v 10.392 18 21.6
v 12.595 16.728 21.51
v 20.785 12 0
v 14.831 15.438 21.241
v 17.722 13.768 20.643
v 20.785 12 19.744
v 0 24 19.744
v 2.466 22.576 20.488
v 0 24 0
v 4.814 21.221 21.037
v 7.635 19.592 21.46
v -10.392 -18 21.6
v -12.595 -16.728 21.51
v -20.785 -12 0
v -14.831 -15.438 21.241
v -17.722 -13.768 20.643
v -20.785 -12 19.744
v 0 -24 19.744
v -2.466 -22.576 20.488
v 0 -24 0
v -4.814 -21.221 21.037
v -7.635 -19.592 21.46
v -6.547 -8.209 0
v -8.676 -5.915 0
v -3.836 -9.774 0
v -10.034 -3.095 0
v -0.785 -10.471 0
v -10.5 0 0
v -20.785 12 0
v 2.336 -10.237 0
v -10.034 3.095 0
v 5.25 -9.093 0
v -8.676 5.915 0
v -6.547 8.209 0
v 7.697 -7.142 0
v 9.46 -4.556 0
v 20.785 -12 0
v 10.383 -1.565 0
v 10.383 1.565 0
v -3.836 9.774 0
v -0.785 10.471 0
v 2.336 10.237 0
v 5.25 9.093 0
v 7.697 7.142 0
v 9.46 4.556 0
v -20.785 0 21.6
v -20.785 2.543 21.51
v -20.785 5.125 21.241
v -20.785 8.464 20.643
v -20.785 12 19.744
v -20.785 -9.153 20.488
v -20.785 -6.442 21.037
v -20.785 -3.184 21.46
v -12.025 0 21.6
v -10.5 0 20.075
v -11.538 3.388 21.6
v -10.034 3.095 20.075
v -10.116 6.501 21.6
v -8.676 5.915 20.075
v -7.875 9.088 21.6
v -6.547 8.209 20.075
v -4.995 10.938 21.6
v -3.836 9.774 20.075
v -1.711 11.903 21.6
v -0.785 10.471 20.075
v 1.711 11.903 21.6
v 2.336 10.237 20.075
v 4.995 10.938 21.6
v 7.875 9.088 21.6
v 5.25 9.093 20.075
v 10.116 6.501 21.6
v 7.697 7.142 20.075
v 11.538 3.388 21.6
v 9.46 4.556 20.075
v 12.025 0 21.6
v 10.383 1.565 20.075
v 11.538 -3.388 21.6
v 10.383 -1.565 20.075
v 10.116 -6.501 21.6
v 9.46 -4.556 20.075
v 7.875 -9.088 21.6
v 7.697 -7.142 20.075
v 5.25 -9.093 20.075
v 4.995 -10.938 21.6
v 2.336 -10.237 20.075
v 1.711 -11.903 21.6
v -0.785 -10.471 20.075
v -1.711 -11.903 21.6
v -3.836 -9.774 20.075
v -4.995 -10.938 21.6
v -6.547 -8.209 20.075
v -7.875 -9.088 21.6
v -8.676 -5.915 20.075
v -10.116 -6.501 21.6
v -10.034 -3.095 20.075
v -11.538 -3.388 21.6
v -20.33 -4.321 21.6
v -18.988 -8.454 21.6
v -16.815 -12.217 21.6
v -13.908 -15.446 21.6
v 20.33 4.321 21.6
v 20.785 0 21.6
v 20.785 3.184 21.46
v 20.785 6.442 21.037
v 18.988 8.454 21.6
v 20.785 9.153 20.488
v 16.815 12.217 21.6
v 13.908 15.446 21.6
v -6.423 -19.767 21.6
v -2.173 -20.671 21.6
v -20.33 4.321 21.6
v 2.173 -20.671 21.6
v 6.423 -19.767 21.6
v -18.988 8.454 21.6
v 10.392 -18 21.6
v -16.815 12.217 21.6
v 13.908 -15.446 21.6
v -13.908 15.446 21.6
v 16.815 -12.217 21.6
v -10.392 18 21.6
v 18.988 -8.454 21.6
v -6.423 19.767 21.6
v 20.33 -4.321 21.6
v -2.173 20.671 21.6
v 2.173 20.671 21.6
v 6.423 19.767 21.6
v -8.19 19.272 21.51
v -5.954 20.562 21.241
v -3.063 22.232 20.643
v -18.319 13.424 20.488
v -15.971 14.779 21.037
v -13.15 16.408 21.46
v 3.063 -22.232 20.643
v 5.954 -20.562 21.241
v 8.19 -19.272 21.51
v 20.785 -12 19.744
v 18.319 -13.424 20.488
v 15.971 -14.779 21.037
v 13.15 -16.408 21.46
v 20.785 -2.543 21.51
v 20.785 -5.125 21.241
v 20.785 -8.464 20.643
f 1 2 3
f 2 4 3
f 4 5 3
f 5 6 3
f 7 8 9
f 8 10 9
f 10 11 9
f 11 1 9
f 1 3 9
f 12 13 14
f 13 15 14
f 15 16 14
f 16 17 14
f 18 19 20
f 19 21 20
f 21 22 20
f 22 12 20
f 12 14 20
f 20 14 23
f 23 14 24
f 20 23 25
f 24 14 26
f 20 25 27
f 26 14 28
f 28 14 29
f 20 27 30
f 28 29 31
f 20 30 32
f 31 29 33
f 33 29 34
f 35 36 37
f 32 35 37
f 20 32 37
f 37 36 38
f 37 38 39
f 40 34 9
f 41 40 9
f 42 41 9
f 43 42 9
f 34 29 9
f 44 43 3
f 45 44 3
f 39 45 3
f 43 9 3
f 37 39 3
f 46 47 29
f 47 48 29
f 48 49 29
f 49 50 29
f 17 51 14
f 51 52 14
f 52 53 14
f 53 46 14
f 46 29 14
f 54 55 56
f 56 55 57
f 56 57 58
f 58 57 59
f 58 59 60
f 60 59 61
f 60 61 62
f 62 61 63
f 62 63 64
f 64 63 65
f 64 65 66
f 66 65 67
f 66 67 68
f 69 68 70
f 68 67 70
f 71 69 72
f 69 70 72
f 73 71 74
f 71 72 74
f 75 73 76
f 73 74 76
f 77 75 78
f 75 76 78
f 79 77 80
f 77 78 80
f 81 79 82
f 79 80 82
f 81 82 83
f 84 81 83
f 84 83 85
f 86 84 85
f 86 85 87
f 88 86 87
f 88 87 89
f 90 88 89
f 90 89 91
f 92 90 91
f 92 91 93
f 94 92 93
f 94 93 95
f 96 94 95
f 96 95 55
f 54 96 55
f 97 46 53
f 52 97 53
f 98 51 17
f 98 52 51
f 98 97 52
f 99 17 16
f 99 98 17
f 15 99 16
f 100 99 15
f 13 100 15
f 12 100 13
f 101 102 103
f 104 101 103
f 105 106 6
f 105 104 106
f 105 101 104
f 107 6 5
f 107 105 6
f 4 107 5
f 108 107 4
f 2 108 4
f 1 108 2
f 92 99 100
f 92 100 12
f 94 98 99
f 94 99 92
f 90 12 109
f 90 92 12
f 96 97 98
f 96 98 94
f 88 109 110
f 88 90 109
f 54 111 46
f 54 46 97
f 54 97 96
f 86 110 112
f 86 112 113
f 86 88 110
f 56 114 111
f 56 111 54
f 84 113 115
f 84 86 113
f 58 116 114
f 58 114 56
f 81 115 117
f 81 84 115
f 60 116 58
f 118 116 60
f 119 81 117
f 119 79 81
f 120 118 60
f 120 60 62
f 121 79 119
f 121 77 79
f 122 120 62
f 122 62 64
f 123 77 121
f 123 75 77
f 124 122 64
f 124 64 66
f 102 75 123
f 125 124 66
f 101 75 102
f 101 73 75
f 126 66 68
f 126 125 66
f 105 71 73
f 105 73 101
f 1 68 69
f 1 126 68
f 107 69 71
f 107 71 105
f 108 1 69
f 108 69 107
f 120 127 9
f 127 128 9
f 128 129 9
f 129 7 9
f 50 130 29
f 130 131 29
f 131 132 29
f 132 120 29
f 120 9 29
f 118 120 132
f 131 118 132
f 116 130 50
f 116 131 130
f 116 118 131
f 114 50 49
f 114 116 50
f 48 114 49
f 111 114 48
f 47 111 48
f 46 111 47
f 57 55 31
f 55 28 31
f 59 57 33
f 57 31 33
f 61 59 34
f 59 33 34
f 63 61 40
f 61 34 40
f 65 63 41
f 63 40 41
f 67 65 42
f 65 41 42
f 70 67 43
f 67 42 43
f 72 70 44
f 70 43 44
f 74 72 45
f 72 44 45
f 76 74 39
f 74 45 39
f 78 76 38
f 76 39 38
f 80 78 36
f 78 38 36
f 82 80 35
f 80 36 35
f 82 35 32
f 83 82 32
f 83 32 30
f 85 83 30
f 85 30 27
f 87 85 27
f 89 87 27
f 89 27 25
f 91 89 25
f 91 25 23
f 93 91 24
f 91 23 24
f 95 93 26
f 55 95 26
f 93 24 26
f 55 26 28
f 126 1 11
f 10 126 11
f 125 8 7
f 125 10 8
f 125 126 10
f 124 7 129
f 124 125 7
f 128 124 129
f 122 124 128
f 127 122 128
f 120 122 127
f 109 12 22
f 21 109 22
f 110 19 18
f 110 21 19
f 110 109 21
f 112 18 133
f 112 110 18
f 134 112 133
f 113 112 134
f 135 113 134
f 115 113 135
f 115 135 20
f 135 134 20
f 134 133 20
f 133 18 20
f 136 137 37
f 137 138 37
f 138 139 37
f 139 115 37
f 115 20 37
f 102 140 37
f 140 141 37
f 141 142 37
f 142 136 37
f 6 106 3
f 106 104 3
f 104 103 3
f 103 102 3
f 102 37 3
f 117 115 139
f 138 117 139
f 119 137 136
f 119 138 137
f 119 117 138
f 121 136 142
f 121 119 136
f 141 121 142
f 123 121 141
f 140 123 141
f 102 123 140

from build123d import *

# Parameters (mm, degrees)
BOSS_EXTRUDE1_DEPTH          = 21.6
SKETCH3_OUTSIDE_W            = 131.808
SKETCH3_OUTSIDE_H            = 138.238
SKETCH3_OUTSIDE_R            = 20.784609691
CUT_EXTRUDE1_DEPTH           = 21.6
CUT_EXTRUDE1_DRAFT           = -60
M24_TAPPED_HOLE1_D           = 21
M24_TAPPED_HOLE1_CSINK_D     = 24.05
M24_TAPPED_HOLE1_CSINK_ANGLE = 90


with BuildPart() as part:
    # Sketch1 → Boss-Extrude1 (new body)
    with BuildSketch(Plane.XY):
        Polygon((20.784609691, -12), (20.784609691, 12), (0, 24), (-20.784609691, 12), (-20.784609691, -12), (0, -24), align=None)
    extrude(amount=BOSS_EXTRUDE1_DEPTH)


with BuildPart() as cut_extrude1_tool:
    # Sketch3 outside → Cut-Extrude1 (with draft: the straight prism first)
    with BuildSketch(Plane.XY.offset(21.6)):
        Rectangle(SKETCH3_OUTSIDE_W, SKETCH3_OUTSIDE_H)
        Circle(SKETCH3_OUTSIDE_R, mode=Mode.SUBTRACT)
    extrude(amount=-CUT_EXTRUDE1_DEPTH)
    # Cut-Extrude1: the draft: its side faces are tilted about the plane it starts from
    cut_extrude1_sides = [cut_extrude1_tool.faces().sort_by_distance(p)[0] for p in [
        (0, -69.119, 10.8),
        (65.904, 0, 10.8),
        (0, 69.119, 10.8),
        (-65.904, 0, 10.8),
        (-20.784609691, 0, 10.8),
    ]]
    draft(cut_extrude1_sides, Plane.XY.offset(21.6), CUT_EXTRUDE1_DRAFT)


with BuildPart() as part_1:
    add(part.part)

    # Cut-Extrude1: cut by cut_extrude1_tool
    add(cut_extrude1_tool.part, mode=Mode.SUBTRACT)

    # M24 Tapped Hole1 (through all)
    with Locations(Plane.XY.offset(21.6)):
        with Locations((0, 0)):
            CounterSinkHole(M24_TAPPED_HOLE1_D / 2, M24_TAPPED_HOLE1_CSINK_D / 2, counter_sink_angle=M24_TAPPED_HOLE1_CSINK_ANGLE)


solid = part_1.part
